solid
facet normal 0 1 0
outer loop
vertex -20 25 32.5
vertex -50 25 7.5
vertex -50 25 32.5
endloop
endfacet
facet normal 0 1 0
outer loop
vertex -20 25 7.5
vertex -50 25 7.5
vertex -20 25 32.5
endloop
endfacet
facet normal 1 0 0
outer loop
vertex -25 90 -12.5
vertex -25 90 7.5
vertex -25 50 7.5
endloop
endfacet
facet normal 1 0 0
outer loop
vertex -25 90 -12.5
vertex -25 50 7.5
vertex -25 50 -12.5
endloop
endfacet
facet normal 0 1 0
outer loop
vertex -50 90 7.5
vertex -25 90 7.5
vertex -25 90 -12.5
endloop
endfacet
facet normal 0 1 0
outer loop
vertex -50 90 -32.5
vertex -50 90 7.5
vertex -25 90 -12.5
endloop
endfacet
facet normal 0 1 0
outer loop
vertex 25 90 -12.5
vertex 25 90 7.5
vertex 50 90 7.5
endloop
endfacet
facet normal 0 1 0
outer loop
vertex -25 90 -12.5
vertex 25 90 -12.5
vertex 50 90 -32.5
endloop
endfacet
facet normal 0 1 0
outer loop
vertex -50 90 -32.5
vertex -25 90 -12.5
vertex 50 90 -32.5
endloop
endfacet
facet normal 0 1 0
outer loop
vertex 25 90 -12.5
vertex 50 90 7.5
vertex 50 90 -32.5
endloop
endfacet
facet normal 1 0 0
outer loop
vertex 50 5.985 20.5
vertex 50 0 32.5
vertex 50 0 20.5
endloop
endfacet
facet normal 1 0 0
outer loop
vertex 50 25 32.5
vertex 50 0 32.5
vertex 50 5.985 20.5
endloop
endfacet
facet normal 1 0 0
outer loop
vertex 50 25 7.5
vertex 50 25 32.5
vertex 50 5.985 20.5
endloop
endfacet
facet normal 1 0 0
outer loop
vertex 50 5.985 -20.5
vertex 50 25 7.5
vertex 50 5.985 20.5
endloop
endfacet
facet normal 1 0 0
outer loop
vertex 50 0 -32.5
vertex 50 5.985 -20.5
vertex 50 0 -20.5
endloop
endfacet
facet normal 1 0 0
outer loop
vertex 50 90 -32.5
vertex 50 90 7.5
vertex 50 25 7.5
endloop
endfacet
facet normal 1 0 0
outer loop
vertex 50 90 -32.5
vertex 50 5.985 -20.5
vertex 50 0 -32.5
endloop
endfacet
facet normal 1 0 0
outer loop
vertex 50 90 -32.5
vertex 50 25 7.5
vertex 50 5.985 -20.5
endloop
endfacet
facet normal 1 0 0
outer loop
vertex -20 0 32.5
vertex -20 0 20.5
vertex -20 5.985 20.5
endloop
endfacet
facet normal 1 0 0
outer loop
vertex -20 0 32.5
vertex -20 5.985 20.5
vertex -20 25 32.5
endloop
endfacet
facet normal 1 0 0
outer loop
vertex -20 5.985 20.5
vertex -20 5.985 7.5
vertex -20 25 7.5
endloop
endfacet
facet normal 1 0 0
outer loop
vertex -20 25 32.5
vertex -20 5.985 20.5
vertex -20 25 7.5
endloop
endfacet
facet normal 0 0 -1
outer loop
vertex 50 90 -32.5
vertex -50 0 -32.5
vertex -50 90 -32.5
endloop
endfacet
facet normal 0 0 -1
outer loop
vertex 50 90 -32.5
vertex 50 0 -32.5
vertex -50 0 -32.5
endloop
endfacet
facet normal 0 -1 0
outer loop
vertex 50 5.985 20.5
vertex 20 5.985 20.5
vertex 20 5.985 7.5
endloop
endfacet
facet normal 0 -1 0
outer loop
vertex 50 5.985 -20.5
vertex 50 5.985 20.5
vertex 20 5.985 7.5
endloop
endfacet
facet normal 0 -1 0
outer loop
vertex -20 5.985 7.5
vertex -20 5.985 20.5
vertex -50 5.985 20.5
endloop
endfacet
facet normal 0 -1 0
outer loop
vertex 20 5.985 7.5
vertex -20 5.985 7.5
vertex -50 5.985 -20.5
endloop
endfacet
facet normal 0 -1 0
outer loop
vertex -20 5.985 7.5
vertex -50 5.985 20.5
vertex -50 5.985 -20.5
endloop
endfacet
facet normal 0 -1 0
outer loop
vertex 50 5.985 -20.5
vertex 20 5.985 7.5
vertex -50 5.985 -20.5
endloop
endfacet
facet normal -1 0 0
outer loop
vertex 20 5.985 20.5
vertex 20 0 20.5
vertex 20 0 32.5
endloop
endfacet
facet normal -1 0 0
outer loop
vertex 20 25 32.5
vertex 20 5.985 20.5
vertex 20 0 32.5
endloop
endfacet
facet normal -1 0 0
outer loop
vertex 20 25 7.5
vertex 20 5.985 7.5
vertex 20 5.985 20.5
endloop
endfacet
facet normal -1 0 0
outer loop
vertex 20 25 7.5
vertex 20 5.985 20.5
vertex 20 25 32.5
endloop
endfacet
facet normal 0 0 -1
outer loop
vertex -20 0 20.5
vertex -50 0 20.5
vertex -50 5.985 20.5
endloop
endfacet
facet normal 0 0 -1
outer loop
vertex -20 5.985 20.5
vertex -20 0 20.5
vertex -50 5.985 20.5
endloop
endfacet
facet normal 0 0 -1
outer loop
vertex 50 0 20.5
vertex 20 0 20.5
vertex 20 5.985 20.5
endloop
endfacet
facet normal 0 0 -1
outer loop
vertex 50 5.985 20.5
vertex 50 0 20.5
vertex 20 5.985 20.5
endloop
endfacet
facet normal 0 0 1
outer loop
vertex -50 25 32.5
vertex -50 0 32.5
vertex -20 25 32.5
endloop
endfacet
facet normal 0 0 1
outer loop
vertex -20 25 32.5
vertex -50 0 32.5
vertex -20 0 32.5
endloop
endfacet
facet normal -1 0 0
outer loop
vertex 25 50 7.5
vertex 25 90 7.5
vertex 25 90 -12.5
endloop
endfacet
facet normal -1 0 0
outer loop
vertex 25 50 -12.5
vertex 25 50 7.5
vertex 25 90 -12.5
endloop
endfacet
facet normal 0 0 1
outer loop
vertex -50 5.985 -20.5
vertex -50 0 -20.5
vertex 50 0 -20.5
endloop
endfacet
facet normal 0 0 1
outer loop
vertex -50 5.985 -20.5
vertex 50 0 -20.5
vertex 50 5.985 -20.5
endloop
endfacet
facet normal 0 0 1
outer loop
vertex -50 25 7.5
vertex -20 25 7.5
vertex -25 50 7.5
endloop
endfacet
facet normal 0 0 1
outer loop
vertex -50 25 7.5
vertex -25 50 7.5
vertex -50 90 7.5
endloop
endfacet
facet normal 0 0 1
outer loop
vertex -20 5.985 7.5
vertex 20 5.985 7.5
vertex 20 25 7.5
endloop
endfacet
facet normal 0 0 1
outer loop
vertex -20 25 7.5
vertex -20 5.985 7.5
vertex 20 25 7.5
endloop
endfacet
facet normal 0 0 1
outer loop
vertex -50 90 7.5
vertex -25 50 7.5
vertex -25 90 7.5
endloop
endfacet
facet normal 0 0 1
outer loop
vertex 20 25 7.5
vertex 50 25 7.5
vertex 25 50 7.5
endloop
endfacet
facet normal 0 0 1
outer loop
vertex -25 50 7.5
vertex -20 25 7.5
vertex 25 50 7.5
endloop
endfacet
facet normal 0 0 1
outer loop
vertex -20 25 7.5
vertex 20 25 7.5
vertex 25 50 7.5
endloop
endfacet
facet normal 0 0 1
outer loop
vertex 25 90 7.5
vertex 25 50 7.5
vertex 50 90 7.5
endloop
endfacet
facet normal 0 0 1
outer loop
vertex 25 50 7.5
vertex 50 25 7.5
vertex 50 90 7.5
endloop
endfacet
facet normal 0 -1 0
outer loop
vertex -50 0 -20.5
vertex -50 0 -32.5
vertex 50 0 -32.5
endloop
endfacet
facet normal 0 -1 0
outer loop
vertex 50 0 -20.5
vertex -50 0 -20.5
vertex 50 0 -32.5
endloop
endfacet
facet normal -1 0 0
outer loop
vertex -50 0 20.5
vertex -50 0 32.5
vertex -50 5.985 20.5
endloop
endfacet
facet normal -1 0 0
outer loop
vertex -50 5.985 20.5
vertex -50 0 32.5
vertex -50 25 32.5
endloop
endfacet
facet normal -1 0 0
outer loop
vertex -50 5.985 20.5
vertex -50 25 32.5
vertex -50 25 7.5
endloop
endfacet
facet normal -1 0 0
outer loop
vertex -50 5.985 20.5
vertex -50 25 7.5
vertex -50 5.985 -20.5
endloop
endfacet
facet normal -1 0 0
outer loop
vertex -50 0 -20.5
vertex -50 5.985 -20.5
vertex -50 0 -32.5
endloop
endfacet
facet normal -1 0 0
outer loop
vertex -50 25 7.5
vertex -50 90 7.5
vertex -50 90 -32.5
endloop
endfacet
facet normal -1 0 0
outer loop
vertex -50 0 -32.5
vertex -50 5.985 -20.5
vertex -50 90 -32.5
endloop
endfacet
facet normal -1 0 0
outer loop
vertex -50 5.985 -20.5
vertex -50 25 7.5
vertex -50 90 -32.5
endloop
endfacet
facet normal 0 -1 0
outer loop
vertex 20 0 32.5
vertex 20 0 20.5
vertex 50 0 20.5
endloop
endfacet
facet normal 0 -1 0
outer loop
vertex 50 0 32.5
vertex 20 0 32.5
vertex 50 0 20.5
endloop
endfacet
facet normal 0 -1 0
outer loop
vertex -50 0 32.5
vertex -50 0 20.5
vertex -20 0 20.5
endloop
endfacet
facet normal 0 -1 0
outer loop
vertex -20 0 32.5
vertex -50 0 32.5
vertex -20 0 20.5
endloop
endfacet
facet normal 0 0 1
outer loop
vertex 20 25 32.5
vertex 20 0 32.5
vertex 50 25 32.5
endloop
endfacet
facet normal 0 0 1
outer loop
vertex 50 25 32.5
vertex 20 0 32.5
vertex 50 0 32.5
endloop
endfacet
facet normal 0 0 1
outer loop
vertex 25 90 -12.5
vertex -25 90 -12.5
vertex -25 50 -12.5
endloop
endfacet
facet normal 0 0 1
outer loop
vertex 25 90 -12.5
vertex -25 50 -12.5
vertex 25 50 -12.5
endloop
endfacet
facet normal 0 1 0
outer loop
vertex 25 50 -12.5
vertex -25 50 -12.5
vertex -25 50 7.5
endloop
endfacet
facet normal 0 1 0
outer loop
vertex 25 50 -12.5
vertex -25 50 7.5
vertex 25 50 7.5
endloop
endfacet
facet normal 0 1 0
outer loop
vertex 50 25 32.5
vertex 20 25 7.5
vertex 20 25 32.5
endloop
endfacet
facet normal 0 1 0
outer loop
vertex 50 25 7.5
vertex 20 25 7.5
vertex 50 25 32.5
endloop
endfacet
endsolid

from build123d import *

# Parameters (mm, degrees)
SKETCH2_W               = 100
SKETCH2_H               = 65
BOSS_EXTRUDE1_DEPTH     = 25
SKETCH3_W               = 40
SKETCH3_H               = 65
BOSS_EXTRUDE2_DEPTH     = 50
SKETCH4_W               = 50
SKETCH4_H               = 20
CUT_EXTRUDE1_DEPTH      = 40
CUT_EXTRUDE2_DEPTH      = 139.406105357
CUT_EXTRUDE2_DEPTH_BACK = 139.406105357
SKETCH5_W               = 41
SKETCH5_H               = 5.985076192
CUT_EXTRUDE4_START      = -25
SKETCH6_W               = 40
SKETCH6_H               = 25
CUT_EXTRUDE4_DEPTH      = 25


with BuildPart() as part:
    # Sketch2 → Boss-Extrude1 (new body)
    with BuildSketch(Plane(origin=(0, 0, 0), x_dir=(1, 0, 0), z_dir=(0, 1, 0))):
        Rectangle(SKETCH2_W, SKETCH2_H)
    extrude(amount=BOSS_EXTRUDE1_DEPTH)

    # Sketch3 → Boss-Extrude2 (add, symmetric)
    with BuildSketch(Plane(origin=(0, 0, 0), x_dir=(0, 0, -1), z_dir=(1, 0, 0))):
        with Locations((12.5, 57.5)):
            Rectangle(SKETCH3_W, SKETCH3_H)
    extrude(amount=BOSS_EXTRUDE2_DEPTH, both=True)

    # Sketch4 → Cut-Extrude1 (cut)
    with BuildSketch(Plane(origin=(0, 90, 0), x_dir=(1, 0, 0), z_dir=(0, 1, 0))):
        with Locations((0, 2.5)):
            Rectangle(SKETCH4_W, SKETCH4_H)
    extrude(amount=-CUT_EXTRUDE1_DEPTH, mode=Mode.SUBTRACT)

    # Sketch5 → Cut-Extrude2 (cut, two sides: drawn at the far end of the back side and taken through both)
    with BuildSketch(Plane(origin=(50, 0, 0), x_dir=(0, 0, -1), z_dir=(1, 0, 0)).offset(-CUT_EXTRUDE2_DEPTH_BACK)):
        with Locations((0, 2.992538096)):
            Rectangle(SKETCH5_W, SKETCH5_H)
    extrude(amount=CUT_EXTRUDE2_DEPTH + CUT_EXTRUDE2_DEPTH_BACK, mode=Mode.SUBTRACT)

    # Sketch6 → Cut-Extrude4 (cut)
    with BuildSketch(Plane.XY.offset(32.5).offset(CUT_EXTRUDE4_START)):
        with Locations((0, 12.5)):
            Rectangle(SKETCH6_W, SKETCH6_H)
    extrude(amount=CUT_EXTRUDE4_DEPTH, mode=Mode.SUBTRACT)


solid = part.part
